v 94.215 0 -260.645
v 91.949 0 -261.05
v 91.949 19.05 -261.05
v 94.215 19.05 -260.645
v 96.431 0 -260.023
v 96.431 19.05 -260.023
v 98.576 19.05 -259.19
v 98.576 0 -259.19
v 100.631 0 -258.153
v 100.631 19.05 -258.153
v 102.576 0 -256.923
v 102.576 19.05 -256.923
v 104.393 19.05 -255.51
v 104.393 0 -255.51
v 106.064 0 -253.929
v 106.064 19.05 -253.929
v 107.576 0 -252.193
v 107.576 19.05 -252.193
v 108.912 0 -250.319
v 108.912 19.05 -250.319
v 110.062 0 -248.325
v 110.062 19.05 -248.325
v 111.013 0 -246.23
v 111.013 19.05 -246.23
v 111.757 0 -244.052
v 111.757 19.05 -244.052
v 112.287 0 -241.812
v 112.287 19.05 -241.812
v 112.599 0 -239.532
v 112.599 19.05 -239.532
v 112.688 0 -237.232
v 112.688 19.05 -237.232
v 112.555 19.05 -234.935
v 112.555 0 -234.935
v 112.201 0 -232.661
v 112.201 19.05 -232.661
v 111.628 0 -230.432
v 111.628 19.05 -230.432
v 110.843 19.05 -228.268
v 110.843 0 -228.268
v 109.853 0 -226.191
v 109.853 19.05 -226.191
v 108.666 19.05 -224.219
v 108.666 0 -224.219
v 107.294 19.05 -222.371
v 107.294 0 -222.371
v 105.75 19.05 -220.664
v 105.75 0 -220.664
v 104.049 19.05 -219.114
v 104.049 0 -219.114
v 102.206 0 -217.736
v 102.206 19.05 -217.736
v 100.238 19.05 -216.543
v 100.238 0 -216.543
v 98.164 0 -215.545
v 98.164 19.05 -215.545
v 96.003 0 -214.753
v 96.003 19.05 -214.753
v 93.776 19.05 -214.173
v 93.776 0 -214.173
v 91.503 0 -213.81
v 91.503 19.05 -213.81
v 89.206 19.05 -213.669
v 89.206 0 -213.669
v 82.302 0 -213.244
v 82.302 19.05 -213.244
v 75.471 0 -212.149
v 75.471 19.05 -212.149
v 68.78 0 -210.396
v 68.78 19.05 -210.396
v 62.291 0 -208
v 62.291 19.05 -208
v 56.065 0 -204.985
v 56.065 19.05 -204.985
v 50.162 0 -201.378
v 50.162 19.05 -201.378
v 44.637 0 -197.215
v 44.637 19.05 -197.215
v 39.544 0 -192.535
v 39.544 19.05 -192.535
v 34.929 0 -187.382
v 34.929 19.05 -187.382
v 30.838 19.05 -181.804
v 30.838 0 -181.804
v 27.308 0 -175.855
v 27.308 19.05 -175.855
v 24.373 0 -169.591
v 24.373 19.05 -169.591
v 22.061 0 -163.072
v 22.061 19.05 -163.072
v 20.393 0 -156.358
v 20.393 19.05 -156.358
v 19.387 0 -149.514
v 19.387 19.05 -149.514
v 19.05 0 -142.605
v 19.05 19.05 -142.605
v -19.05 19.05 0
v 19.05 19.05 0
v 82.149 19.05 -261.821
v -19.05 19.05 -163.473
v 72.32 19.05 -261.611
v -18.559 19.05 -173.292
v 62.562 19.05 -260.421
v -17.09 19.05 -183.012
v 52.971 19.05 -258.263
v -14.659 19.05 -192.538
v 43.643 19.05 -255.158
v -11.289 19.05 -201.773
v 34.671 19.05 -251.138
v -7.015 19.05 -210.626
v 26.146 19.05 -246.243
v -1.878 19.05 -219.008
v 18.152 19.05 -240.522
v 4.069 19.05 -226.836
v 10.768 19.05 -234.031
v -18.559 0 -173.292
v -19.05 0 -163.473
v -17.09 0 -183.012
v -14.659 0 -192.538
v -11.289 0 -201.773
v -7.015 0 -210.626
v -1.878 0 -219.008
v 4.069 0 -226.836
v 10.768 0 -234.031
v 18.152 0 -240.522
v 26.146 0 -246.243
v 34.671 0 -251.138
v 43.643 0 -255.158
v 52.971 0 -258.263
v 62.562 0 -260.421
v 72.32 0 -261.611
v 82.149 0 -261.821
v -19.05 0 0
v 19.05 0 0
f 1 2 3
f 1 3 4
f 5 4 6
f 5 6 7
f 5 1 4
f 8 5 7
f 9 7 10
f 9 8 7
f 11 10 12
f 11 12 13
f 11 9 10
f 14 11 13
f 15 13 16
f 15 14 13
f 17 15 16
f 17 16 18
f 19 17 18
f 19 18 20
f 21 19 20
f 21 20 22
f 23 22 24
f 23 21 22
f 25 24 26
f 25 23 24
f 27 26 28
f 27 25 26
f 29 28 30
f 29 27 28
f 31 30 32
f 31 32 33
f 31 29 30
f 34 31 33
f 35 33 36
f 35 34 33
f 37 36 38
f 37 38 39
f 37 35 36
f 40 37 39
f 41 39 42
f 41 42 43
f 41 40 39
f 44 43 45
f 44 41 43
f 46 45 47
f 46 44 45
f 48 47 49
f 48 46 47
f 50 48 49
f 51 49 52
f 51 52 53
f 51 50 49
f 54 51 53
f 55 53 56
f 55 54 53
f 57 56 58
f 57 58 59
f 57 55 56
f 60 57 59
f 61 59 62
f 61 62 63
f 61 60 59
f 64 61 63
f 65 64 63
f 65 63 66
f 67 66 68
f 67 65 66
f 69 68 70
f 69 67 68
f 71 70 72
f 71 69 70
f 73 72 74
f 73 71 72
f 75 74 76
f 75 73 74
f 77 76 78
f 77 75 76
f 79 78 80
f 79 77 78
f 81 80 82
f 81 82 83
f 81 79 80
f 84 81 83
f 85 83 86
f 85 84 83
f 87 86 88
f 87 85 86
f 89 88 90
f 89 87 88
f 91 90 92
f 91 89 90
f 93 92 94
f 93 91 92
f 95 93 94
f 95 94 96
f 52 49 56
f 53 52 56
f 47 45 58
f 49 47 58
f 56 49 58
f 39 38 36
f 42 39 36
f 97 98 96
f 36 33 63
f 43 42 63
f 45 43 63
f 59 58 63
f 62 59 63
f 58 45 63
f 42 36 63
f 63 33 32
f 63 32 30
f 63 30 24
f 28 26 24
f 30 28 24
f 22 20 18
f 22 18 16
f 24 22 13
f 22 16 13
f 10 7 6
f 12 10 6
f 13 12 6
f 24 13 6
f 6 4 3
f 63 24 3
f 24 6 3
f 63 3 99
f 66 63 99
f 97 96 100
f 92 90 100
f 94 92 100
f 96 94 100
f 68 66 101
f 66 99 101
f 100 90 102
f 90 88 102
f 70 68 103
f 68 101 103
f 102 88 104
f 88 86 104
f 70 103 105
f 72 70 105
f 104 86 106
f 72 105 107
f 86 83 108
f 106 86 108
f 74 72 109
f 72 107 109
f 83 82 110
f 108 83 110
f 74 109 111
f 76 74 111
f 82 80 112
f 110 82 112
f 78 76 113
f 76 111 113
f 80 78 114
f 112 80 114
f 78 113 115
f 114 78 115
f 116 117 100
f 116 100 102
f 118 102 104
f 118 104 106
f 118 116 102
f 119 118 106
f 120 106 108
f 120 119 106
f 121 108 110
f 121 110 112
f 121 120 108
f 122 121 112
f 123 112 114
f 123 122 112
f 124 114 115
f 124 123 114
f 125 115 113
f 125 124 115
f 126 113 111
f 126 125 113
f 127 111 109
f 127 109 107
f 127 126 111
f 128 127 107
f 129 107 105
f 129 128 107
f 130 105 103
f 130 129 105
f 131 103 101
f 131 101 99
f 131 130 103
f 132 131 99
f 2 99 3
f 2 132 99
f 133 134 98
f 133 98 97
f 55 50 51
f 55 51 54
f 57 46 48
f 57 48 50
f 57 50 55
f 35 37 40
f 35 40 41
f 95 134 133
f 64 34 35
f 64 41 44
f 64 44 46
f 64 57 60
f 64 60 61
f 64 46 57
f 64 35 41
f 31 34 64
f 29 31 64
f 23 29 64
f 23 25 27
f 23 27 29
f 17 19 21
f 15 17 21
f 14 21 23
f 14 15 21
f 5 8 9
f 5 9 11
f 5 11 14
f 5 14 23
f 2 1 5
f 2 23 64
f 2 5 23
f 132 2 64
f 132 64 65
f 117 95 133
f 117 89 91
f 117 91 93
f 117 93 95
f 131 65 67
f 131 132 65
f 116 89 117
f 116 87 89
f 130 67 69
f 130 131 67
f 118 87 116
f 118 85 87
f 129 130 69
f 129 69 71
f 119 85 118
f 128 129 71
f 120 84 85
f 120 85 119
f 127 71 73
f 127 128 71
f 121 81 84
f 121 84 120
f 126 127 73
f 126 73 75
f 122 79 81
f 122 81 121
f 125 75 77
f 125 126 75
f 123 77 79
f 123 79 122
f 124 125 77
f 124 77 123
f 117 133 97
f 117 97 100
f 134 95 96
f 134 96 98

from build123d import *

# Parameters (mm, degrees)
BOSS_EXTRUDE1_DEPTH = 19.05


with BuildPart() as part:
    # Sketch1 → Boss-Extrude1 (new body)
    with BuildSketch(Plane(origin=(0, 0, 0), x_dir=(1, 0, 0), z_dir=(0, 1, 0))):
        with BuildLine():
            Line((-19.05, 142.604993733), (-19.05, 163.473390846))
            ThreePointArc((-19.05, 163.473390846), (14.378745185, 237.368638748), (91.949229987, 261.050035552))
            ThreePointArc((91.949229987, 261.050035552), (112.649599057, 236.081870166), (89.206052596, 213.669492074))
            ThreePointArc((89.206052596, 213.669492074), (39.543801874, 192.535031386), (19.05, 142.604993733))
            Line((19.05, 142.604993733), (19.05, 0))
            Line((19.05, 0), (-19.05, 0))
            Line((-19.05, 0), (-19.05, 142.604993733))
        make_face()
    extrude(amount=BOSS_EXTRUDE1_DEPTH)


solid = part.part
